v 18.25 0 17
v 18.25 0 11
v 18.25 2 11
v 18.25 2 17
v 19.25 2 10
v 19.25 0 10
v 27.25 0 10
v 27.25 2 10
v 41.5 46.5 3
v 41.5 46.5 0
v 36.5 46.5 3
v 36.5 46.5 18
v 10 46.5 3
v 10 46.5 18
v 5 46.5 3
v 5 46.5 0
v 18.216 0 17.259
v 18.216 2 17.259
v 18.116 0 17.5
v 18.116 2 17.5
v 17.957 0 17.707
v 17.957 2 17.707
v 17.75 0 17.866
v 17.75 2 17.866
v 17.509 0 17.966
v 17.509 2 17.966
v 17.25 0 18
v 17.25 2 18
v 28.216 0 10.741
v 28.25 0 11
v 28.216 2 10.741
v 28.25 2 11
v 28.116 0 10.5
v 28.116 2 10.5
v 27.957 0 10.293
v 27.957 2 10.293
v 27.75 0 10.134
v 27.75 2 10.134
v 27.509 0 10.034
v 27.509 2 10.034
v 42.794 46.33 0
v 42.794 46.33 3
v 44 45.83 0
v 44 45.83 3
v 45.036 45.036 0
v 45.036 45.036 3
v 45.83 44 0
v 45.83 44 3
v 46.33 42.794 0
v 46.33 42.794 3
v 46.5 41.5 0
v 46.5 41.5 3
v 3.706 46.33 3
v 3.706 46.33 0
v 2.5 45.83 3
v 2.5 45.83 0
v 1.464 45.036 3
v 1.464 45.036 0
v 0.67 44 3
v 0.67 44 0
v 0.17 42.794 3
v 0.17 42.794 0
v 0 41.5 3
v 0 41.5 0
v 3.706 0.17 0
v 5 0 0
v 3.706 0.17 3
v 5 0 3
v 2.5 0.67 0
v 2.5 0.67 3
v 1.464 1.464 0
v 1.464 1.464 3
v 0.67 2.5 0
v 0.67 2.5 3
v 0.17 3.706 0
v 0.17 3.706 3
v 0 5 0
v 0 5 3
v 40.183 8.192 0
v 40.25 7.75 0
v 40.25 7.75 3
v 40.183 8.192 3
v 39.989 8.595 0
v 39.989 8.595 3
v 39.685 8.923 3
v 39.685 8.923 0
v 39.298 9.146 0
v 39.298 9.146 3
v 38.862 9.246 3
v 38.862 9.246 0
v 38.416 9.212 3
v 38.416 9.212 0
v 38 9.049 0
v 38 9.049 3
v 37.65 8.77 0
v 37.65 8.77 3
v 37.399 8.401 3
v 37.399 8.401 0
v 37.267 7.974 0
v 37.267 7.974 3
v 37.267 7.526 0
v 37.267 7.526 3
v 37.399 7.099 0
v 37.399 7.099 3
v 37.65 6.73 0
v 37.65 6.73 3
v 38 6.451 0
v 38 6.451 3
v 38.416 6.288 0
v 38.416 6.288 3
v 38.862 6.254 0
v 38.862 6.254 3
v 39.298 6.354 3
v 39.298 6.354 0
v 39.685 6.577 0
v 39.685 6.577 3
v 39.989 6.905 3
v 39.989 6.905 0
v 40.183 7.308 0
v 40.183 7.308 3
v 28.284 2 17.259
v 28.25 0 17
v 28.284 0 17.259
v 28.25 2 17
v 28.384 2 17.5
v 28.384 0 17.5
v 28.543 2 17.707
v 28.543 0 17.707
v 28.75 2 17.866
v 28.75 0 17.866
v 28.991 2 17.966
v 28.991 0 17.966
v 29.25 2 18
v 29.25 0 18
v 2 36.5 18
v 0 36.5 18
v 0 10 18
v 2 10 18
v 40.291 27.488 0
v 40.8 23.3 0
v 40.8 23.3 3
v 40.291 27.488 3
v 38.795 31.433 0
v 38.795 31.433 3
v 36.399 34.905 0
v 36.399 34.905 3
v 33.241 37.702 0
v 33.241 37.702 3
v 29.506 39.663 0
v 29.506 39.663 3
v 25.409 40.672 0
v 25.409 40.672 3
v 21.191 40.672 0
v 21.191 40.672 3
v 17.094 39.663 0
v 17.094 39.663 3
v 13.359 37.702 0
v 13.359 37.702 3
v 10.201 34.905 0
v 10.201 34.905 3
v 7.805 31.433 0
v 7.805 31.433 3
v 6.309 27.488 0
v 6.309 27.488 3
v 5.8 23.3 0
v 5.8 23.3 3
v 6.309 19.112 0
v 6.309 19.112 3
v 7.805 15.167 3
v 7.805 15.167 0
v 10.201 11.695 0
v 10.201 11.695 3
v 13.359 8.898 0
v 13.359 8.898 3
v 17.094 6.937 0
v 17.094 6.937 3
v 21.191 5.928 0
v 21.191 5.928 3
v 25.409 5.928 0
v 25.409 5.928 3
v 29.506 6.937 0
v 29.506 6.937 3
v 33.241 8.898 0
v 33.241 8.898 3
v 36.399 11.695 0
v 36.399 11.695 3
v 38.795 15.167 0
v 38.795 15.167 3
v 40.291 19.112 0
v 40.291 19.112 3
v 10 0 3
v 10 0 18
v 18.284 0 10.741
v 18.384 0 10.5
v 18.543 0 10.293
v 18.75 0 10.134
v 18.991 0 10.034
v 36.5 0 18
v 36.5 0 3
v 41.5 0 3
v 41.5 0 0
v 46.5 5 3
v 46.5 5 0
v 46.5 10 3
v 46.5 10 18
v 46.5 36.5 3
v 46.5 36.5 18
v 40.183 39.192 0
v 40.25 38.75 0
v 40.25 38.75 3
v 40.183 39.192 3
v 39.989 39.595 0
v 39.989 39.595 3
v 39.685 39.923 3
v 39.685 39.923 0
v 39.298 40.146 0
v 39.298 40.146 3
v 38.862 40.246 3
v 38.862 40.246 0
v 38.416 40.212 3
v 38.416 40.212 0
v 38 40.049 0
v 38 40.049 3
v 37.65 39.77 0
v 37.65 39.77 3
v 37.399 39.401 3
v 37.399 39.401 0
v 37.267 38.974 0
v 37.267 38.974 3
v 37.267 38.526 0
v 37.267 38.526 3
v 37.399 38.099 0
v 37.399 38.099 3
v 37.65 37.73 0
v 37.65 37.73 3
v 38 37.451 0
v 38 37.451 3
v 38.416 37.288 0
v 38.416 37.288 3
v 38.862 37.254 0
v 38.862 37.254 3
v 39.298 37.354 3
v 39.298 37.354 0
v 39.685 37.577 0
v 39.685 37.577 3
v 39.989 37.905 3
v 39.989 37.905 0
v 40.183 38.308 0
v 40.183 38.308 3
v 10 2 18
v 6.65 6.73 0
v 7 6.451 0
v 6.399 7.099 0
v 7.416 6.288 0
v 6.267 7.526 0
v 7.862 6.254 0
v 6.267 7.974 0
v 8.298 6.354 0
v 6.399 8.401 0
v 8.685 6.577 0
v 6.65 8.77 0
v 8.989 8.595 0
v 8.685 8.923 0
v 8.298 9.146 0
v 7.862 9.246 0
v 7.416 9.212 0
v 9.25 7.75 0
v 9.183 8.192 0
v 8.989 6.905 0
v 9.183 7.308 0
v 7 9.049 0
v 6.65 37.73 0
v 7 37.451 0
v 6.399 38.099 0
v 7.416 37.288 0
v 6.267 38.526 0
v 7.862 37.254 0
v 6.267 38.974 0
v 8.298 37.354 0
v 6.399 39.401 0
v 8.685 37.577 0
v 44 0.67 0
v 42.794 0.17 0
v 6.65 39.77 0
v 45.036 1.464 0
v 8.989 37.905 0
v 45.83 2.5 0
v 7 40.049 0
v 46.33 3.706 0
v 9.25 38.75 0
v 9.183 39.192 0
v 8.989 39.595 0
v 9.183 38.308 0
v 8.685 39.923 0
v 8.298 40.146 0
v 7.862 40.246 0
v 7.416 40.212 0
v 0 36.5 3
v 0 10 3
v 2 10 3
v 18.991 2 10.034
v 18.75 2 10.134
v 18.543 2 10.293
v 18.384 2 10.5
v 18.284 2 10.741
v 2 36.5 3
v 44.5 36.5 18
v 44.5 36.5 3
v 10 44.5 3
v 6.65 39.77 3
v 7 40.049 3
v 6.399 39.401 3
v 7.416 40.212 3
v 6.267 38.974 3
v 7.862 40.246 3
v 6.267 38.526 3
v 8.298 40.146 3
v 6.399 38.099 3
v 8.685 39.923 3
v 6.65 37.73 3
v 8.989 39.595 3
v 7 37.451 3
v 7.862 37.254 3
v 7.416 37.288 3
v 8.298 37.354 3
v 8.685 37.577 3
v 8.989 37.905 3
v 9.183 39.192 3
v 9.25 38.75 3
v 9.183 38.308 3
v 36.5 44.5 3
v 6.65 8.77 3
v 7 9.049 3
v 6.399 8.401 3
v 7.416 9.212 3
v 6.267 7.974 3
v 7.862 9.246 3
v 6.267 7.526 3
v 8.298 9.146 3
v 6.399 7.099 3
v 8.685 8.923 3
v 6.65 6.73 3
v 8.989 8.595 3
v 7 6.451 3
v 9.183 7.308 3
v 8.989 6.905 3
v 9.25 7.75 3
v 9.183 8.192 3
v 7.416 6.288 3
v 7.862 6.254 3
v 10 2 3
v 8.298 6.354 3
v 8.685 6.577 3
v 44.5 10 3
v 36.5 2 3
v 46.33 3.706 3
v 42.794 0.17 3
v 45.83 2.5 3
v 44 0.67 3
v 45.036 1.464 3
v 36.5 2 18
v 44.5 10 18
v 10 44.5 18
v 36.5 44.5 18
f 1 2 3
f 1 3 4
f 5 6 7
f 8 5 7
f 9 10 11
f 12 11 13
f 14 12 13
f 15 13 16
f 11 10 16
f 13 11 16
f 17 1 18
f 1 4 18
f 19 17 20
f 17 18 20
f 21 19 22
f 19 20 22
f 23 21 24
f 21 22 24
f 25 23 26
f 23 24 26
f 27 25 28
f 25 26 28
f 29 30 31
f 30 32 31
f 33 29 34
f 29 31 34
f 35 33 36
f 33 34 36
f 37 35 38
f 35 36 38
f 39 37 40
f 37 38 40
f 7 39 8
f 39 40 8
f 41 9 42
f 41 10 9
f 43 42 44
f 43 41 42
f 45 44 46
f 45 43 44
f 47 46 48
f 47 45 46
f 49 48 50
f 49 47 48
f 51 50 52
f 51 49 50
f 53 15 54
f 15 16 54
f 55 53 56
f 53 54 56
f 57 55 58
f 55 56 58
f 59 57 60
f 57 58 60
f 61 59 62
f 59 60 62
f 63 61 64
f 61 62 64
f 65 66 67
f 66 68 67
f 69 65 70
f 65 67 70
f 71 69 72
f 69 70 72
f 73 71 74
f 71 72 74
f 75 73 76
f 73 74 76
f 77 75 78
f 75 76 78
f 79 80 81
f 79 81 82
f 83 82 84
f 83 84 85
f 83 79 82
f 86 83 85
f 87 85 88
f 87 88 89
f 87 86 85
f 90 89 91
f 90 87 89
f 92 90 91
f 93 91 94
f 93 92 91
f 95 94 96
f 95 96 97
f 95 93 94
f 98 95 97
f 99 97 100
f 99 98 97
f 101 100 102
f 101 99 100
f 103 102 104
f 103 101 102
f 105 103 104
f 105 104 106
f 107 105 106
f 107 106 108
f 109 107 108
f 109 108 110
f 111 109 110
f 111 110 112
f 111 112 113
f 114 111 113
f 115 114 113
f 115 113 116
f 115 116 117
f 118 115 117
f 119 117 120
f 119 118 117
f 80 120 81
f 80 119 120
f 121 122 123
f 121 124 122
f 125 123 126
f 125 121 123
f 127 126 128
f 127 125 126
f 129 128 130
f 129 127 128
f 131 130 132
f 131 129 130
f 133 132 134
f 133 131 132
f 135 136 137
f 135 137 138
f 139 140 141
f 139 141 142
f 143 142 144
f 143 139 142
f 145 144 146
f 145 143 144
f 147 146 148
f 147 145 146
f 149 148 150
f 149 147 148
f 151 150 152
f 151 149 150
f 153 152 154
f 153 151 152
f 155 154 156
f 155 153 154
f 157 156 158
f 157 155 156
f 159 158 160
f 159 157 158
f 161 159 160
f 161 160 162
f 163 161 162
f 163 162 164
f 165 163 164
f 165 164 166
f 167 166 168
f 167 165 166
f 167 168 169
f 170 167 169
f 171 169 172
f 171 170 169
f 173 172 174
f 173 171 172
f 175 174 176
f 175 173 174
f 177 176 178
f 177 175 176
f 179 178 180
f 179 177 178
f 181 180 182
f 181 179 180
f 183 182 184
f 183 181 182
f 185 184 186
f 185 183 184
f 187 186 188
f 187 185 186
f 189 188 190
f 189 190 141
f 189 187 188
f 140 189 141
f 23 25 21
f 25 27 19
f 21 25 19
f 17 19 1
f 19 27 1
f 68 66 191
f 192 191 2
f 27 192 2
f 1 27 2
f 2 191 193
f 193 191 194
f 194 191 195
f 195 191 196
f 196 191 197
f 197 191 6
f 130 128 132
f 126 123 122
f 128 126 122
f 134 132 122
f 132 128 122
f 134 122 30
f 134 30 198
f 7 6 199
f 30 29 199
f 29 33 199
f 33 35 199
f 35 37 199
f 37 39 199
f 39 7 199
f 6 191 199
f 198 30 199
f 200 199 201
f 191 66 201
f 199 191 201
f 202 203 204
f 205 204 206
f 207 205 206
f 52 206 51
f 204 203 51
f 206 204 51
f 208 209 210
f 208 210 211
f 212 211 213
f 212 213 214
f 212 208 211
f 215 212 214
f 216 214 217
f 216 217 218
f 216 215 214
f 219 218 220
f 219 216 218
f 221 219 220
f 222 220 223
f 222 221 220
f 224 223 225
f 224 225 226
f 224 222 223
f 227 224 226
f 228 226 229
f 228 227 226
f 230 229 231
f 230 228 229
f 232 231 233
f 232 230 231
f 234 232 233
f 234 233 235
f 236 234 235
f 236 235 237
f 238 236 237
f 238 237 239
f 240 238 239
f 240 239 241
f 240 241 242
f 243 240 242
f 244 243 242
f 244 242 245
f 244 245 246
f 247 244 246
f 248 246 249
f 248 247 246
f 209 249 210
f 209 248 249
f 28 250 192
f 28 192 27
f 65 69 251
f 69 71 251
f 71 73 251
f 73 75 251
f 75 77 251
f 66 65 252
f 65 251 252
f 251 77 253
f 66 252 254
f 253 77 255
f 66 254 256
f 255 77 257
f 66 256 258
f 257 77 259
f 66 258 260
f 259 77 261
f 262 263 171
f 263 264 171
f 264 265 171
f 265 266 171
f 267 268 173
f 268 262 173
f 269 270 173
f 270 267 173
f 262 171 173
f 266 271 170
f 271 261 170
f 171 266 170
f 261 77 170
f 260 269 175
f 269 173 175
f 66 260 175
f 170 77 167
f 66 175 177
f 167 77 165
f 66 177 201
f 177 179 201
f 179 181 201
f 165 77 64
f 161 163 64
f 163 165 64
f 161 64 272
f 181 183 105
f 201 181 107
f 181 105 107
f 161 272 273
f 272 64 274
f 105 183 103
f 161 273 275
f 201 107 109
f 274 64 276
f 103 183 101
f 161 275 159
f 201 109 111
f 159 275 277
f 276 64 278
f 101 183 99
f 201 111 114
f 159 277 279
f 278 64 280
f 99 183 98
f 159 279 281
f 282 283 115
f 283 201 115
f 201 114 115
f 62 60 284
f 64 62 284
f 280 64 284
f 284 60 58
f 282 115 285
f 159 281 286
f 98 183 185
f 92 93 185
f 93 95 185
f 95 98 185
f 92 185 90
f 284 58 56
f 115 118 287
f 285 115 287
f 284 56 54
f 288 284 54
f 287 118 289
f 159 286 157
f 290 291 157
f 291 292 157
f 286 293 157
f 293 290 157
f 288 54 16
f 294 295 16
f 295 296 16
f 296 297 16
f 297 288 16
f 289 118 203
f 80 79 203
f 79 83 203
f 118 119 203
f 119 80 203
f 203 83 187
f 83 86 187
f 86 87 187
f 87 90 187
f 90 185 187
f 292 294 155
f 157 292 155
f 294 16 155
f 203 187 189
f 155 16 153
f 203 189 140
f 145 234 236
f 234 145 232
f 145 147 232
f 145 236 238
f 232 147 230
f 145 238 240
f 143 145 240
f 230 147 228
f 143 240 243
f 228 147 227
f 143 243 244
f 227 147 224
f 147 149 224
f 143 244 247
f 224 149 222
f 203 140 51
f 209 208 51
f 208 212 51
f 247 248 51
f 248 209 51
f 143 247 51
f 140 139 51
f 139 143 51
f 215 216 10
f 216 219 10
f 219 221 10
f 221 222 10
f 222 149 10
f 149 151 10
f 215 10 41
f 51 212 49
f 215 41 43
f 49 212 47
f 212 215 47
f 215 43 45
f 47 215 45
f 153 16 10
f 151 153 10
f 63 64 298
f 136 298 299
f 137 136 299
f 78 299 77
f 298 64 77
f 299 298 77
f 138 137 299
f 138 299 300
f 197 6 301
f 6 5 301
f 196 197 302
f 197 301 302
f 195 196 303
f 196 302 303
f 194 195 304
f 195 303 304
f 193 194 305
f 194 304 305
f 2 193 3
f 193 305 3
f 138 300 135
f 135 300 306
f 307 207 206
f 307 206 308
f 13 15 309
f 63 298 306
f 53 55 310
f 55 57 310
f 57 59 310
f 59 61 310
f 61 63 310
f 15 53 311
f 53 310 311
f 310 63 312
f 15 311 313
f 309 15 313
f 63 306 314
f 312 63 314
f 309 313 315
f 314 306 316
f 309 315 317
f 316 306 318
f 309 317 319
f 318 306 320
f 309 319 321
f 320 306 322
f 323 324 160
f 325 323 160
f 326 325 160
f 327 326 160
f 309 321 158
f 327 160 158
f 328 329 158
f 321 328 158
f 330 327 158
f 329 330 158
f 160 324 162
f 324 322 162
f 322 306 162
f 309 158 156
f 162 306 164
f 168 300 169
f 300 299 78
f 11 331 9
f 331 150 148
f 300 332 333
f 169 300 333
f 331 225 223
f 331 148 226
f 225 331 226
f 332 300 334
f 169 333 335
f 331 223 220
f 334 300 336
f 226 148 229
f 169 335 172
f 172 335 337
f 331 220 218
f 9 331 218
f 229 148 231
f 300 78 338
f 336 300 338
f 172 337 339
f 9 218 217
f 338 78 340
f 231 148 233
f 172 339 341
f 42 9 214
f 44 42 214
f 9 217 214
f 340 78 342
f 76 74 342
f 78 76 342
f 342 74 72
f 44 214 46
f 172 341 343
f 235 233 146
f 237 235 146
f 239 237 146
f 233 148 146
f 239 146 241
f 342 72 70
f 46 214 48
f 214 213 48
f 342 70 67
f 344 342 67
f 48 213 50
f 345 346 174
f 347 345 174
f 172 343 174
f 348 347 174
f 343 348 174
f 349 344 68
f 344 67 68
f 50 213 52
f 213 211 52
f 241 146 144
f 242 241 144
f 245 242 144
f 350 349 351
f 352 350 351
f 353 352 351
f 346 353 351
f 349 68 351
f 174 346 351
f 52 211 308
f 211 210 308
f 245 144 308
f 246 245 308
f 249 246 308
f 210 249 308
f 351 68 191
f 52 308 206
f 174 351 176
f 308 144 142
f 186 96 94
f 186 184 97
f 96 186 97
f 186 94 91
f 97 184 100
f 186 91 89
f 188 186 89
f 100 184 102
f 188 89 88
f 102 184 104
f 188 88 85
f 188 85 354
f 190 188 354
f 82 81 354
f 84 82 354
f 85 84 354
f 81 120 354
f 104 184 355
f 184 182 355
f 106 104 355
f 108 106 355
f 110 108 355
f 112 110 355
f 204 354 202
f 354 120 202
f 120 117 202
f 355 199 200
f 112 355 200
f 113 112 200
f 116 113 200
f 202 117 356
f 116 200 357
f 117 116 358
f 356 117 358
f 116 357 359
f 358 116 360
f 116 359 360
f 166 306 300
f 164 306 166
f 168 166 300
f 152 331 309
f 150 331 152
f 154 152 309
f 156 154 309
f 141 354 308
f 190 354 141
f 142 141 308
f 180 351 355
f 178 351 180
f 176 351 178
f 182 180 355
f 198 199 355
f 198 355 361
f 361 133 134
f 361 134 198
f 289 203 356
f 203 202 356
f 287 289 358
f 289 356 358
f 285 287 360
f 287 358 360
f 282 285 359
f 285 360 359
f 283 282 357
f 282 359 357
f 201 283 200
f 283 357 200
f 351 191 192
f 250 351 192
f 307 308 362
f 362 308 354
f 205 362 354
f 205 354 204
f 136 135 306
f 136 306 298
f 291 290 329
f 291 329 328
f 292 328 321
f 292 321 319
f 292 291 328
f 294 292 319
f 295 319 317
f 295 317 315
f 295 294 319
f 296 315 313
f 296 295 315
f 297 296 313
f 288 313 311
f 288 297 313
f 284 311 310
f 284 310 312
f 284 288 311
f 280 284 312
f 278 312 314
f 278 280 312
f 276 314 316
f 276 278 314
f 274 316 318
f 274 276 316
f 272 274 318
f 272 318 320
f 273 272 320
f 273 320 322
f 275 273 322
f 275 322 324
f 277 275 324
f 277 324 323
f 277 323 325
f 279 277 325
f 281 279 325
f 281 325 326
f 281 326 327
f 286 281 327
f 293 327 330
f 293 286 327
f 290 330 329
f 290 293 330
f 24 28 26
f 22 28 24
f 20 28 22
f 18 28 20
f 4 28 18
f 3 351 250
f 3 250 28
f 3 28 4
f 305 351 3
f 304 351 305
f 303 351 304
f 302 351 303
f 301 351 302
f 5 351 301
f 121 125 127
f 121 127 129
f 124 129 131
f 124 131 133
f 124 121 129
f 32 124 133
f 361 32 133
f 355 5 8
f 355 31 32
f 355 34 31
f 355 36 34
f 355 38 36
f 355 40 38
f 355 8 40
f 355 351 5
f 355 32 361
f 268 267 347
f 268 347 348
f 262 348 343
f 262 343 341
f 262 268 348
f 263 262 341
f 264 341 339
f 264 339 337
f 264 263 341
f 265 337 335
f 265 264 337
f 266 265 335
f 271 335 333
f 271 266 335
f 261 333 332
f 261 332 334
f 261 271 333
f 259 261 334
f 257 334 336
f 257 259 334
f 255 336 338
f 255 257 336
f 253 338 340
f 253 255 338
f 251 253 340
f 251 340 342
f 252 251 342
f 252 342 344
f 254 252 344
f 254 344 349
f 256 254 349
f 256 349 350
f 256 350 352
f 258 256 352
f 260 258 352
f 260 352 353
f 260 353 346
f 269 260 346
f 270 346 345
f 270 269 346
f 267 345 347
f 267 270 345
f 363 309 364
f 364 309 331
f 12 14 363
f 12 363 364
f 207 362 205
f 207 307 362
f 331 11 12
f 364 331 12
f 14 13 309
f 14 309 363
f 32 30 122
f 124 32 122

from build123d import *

# Parameters (mm, degrees)
F0_W      = 46.5
F0_H      = 46.5
F0_R      = 1.5
F0_R_2    = 17.5
F1_DEPTH  = 3
F2_W      = 42.5
F2_H      = 2
F3_DEPTH  = 15
F4_W      = 10
F4_H      = 15
F5_DEPTH  = 10
F6_W      = 10
F6_H      = 15
F7_DEPTH  = 10
F8_W      = 10
F8_H      = 15
F9_DEPTH  = 10
F10_W     = 10
F10_H     = 15
F11_DEPTH = 10
F12_R     = 5
F13_R     = 5
F14_R     = 5
F15_R     = 5
F16_W     = 10
F16_H     = 8
F17_DEPTH = 25
F18_R     = 1
F19_R     = 1


with BuildPart() as f1:
    # F0 (on Top) → F1 (new body)
    with BuildSketch(Plane.XY):
        with Locations((23.25, 23.25)):
            Rectangle(F0_W, F0_H)
        with Locations((7.75, 7.75)):
            Circle(F0_R, mode=Mode.SUBTRACT)
        with Locations((38.75, 7.75)):
            Circle(F0_R, mode=Mode.SUBTRACT)
        with Locations((7.75, 38.75)):
            Circle(F0_R, mode=Mode.SUBTRACT)
        with Locations((23.3, 23.3)):
            Circle(F0_R_2, mode=Mode.SUBTRACT)
        with Locations((38.75, 38.75)):
            Circle(F0_R, mode=Mode.SUBTRACT)
    extrude(amount=F1_DEPTH)

    # F2 (on face) → F3 (join)
    with BuildSketch(Plane.XY.offset(3)):
        Polygon((2, 46.5), (0, 46.5), (0, 0), (2, 0), (2, 2), (2, 44.5), align=None)
        with Locations((23.25, 45.5)):
            Rectangle(F2_W, F2_H)
        Polygon((46.5, 46.5), (44.5, 46.5), (44.5, 44.5), (44.5, 2), (44.5, 0), (46.5, 0), align=None)
        with Locations((23.25, 1)):
            Rectangle(F2_W, F2_H)
    extrude(amount=F3_DEPTH)

    # F4 (on face) → F5 (cut)
    with BuildSketch(Plane.XZ):
        with Locations((5, 10.5)):
            Rectangle(F4_W, F4_H)
    extrude(amount=-F5_DEPTH, mode=Mode.SUBTRACT)

    # F6 (on face) → F7 (cut)
    with BuildSketch(Plane(origin=(0, 46.5, 0), x_dir=(-1, 0, 0), z_dir=(0, 1, 0))):
        with Locations((-5, 10.5)):
            Rectangle(F6_W, F6_H)
    extrude(amount=-F7_DEPTH, mode=Mode.SUBTRACT)

    # F8 (on face) → F9 (cut)
    with BuildSketch(Plane(origin=(0, 46.5, 0), x_dir=(-1, 0, 0), z_dir=(0, 1, 0))):
        with Locations((-41.5, 10.5)):
            Rectangle(F8_W, F8_H)
    extrude(amount=-F9_DEPTH, mode=Mode.SUBTRACT)

    # F10 (on face) → F11 (cut)
    with BuildSketch(Plane.XZ):
        with Locations((41.5, 10.5)):
            Rectangle(F10_W, F10_H)
    extrude(amount=-F11_DEPTH, mode=Mode.SUBTRACT)

    # F12
    f12_edges = [f1.edges().sort_by_distance(p)[0] for p in [
        (46.5, 46.5, 1.5),
    ]]
    fillet(f12_edges, radius=F12_R)

    # F13
    f13_edges = [f1.edges().sort_by_distance(p)[0] for p in [
        (0, 46.5, 1.5),
    ]]
    fillet(f13_edges, radius=F13_R)

    # F14
    f14_edges = [f1.edges().sort_by_distance(p)[0] for p in [
        (46.5, 0, 1.5),
    ]]
    fillet(f14_edges, radius=F14_R)

    # F15
    f15_edges = [f1.edges().sort_by_distance(p)[0] for p in [
        (0, 0, 1.5),
    ]]
    fillet(f15_edges, radius=F15_R)

    # F16 (on face) → F17 (cut)
    with BuildSketch(Plane.XZ):
        with Locations((23.25, 14)):
            Rectangle(F16_W, F16_H)
    extrude(amount=-F17_DEPTH, mode=Mode.SUBTRACT)

    # F18
    f18_edges = [f1.edges().sort_by_distance(p)[0] for p in [
        (28.25, 1, 10),
        (18.25, 1, 10),
    ]]
    fillet(f18_edges, radius=F18_R)

    # F19
    f19_edges = [f1.edges().sort_by_distance(p)[0] for p in [
        (18.25, 1, 18),
        (28.25, 1, 18),
    ]]
    fillet(f19_edges, radius=F19_R)


solid = f1.part
